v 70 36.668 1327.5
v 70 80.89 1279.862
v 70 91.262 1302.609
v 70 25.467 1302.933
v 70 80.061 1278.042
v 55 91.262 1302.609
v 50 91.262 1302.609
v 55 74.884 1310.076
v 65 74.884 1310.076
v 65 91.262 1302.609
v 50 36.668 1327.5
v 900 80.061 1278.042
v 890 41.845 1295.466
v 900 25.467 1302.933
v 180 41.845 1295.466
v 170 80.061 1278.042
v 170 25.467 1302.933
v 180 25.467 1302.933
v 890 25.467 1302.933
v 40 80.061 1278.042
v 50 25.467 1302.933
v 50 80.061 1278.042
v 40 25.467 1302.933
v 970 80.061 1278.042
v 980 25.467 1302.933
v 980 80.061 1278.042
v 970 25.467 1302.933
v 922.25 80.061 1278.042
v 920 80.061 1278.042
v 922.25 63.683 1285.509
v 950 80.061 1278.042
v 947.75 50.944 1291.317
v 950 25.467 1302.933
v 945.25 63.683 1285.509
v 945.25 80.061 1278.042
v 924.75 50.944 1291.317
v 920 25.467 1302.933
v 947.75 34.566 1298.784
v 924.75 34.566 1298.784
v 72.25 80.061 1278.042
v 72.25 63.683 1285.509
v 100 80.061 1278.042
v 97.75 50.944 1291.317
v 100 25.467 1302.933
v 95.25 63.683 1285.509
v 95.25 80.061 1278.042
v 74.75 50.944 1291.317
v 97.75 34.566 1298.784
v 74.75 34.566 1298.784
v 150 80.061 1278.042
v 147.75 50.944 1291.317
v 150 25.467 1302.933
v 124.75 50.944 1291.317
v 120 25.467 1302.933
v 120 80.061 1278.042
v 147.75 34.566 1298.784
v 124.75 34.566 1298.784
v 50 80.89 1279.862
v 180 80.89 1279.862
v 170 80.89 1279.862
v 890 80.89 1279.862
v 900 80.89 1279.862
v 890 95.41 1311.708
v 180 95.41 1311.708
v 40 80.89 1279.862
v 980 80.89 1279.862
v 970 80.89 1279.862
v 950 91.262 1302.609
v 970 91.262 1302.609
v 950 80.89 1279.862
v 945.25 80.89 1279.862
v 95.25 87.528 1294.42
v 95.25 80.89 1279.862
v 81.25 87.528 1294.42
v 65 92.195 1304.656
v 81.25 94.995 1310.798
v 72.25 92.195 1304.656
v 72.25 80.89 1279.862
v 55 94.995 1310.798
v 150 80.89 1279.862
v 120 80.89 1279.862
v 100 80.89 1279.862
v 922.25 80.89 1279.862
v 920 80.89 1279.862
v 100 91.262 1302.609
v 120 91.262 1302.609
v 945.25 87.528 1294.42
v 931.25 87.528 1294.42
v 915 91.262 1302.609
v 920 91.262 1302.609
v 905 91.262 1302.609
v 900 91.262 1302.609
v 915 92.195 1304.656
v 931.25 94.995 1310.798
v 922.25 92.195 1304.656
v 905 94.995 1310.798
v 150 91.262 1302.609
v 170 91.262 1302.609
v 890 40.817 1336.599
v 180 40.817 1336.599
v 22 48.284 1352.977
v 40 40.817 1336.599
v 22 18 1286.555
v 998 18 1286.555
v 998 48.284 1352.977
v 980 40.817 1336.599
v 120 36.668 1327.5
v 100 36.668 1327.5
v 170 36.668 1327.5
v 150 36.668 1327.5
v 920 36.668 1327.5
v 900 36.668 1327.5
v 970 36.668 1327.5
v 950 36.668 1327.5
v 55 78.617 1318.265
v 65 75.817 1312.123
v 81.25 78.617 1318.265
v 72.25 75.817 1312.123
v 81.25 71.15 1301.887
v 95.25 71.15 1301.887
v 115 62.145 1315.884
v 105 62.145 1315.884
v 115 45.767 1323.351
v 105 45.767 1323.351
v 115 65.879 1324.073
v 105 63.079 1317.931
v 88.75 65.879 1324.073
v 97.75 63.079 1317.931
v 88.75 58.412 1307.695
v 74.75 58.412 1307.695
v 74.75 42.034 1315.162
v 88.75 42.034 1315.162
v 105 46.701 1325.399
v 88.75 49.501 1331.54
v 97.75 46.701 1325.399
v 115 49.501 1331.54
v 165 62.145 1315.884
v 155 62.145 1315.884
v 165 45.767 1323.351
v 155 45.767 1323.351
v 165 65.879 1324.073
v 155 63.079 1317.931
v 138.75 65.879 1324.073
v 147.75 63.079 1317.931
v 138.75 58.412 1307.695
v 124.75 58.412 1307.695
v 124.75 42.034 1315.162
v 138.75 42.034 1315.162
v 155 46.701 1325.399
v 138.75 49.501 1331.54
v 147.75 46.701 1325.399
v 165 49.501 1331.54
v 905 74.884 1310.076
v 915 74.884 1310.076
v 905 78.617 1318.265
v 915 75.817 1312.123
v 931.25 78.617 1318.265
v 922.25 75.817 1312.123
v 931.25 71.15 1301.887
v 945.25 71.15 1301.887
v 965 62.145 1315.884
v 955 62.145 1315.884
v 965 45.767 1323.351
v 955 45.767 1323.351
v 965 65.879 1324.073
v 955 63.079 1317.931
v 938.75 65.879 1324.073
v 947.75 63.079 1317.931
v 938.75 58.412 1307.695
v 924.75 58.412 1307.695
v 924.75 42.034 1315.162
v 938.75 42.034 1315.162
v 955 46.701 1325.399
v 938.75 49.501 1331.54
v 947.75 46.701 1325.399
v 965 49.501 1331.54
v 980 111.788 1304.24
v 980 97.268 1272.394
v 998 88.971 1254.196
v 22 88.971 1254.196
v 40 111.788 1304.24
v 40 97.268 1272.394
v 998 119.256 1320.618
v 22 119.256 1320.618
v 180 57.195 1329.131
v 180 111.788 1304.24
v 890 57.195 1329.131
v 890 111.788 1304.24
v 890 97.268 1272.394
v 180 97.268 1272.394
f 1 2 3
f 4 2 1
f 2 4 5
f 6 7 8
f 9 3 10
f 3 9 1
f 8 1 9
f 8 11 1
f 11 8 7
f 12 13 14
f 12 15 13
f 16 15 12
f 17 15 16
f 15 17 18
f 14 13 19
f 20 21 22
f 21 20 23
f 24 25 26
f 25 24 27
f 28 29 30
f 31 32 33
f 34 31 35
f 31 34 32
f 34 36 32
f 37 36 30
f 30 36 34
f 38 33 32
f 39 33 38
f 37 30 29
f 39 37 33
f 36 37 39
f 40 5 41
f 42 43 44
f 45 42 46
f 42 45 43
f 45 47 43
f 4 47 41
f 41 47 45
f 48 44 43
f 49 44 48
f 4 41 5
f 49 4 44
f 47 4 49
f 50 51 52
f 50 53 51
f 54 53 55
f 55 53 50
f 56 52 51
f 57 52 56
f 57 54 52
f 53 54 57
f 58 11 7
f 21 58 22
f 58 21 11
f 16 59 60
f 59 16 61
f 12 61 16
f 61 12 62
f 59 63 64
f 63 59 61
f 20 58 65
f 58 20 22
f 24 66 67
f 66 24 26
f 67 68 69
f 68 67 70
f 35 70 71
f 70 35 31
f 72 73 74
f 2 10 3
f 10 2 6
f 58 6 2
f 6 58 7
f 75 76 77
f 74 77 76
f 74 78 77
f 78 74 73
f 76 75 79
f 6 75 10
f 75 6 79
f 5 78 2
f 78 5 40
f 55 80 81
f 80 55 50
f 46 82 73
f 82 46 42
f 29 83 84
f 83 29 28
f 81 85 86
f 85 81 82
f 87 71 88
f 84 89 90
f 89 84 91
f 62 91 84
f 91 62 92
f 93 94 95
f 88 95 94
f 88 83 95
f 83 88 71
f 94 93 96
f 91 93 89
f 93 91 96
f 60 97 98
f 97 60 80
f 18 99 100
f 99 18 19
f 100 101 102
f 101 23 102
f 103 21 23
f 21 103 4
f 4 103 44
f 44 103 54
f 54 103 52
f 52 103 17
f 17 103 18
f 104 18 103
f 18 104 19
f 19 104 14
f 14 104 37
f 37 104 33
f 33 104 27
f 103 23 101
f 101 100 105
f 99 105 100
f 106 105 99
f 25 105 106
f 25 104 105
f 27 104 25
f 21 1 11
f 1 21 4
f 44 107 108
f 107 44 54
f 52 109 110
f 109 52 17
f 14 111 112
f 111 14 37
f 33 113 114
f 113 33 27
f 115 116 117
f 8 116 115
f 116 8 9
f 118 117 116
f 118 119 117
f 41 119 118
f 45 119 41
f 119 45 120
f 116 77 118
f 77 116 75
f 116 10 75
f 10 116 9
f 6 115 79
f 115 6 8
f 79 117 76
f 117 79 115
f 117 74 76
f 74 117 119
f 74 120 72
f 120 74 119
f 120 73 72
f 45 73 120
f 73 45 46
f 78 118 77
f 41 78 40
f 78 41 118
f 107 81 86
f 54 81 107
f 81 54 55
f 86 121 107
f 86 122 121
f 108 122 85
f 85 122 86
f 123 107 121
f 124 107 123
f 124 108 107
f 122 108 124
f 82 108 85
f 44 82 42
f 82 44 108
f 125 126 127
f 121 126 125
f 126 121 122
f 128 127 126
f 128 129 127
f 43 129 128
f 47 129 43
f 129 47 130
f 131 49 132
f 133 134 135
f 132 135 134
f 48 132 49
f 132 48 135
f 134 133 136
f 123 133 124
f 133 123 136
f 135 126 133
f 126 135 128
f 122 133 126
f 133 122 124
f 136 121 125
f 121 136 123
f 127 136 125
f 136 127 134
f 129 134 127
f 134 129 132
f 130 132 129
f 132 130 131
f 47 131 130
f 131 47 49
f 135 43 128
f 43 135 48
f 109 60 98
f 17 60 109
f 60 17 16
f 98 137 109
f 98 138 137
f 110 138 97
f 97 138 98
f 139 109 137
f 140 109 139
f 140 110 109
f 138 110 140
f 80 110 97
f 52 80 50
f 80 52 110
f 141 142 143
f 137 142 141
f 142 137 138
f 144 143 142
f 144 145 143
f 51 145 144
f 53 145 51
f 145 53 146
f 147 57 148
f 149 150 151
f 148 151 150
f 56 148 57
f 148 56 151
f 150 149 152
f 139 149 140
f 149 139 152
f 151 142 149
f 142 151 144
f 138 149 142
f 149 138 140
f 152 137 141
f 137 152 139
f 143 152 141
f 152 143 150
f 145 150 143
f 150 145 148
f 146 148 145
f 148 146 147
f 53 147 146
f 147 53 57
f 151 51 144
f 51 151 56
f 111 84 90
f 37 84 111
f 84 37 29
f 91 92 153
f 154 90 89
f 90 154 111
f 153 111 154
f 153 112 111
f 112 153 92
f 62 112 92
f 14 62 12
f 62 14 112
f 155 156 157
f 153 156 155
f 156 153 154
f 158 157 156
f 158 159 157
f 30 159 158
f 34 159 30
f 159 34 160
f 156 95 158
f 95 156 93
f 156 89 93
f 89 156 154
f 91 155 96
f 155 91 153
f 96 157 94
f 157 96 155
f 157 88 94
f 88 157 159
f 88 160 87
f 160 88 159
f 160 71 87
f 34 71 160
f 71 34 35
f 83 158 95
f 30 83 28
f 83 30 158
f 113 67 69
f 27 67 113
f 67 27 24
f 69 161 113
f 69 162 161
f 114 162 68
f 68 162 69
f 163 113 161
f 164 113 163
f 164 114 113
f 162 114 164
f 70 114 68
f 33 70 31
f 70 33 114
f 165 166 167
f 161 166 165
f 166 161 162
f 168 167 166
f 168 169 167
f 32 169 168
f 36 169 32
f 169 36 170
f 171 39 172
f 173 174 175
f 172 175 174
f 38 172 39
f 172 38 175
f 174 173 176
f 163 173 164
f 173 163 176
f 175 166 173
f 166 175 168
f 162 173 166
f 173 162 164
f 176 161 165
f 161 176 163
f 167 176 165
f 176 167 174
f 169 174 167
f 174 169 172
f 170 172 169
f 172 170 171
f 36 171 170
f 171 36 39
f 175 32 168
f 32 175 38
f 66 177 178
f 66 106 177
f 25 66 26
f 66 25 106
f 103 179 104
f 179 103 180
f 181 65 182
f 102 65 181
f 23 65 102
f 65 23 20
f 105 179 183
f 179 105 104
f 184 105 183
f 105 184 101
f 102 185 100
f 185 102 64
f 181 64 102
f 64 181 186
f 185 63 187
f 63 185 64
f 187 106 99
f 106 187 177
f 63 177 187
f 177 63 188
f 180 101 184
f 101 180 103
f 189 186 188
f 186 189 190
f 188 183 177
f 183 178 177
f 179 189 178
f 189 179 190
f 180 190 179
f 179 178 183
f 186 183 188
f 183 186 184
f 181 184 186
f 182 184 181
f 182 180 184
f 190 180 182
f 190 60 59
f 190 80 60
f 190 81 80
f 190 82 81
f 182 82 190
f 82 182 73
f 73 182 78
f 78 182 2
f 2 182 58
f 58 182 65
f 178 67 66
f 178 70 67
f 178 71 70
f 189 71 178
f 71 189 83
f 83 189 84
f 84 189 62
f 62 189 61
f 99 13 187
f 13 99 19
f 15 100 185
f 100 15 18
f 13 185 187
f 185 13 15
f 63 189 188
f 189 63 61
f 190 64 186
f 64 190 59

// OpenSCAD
// file: params.scad
sheet_thickness=18;				// thickness of the plywood sheet.

laser_width=20;					// width of the laser
laser_height=27;				// height of the laser
laser_origin_height=16;			// center of the laser beam
laser_length=60;				// length of the laser (includes cable allowance).
laser_spread_angle = 2*atan((110/2)/60);	// angle the laser spreads out from origin.

laser_setback        =  48.45*10;	// how much the laser is set back from the center of the bike.
laser_position_z     = 119.26*10;	// height of the laser center.
laser_position_angle =  24.51;		// angle the laser points down.

laser_low = 50;
laser_high=1350;

laser_y = laser_length;

wheel_width=34;					// maximum width of a wheel
wheel_height=670;				// height of a 700CC wheel.

handlebar_width_max = 500;
channel_offset = handlebar_width_max / 2 + 20;
channel_thickness = 50;

base_length=1500;

hb_85=50+laser_width/2;			// position of handlebar 85cm line (centered on laser)
hb_80=hb_85+50;					// position of handlebar 80cm line
hb_75=hb_80+50;					// position of handlebar 75cm line

bb_0=hb_75+750;					// position of bottom bracket line
bb_5=bb_0+50;					// position of bottom bracket +5cm line

// castor dimensions GD-60F (2" wheel, leveling castor).
castor_height = 82;
castor_radius = 61;
castor_plate = 73;

// bottom of the jig from the floor.
base_bottom = sheet_thickness + castor_height;

tab_height = 2*25.4;	// Height of the tabs to attach the column and back.

// utility functions.

function rotate_point(p,a) = [p[0]*cos(a) - p[1]*sin(a), p[0]*sin(a) + p[1]*cos(a)];

// output the sheet thickness so export.py knows how to created the files.
echo( sheet_thickness=sheet_thickness );
// main file
include <params.scad>

show_laser_lines = 0;

laser_clearance = 10;   // Clearance around the laser modules.
lasers_x = hb_85-laser_width/2-laser_clearance-sheet_thickness;
lasers_margin = laser_width/2+laser_clearance+sheet_thickness;
lasers_length = (bb_5-hb_85)+2*lasers_margin;
lasers_height = sheet_thickness*2 + laser_height + laser_clearance;
lasers_width = laser_length+sheet_thickness;

lasers_back_yz = rotate_point( [-laser_length, -laser_origin_height-sheet_thickness],
                    -laser_position_angle );
lasers_front_yz = rotate_point( [sheet_thickness, -laser_origin_height-sheet_thickness],
                    -laser_position_angle );
                    
lasers_effective_width = abs(lasers_back_yz[0]-lasers_front_yz[0]);

base_width =
    sheet_thickness +
    abs(lasers_back_yz[0]) + laser_setback +
    channel_offset +
    sheet_thickness;
 
back_height_over = 5;
back_height=(laser_setback + channel_offset) * tan(laser_spread_angle/2 - laser_position_angle) + laser_position_z + back_height_over;
    
channel_center = base_width - sheet_thickness + channel_offset;

module laser_clamp( p, back ) {
    laser_clearance = 10;
    clamp_thickness = laser_clearance - 1;
    foot_length = 14 + clamp_thickness;
    border = 2.25;
    pad = 10;
    overlap = 0.25;
    
    laser_clamp_points = [
        [0,0],
        [foot_length, 0],
        [foot_length, laser_height + border],
        [foot_length + border + laser_width/2 - pad/2, laser_height + border],
        [foot_length + border + laser_width/2 - pad/2, laser_height - overlap],
        [foot_length + border + laser_width/2 + pad/2, laser_height - overlap],
        [foot_length + border + laser_width/2 + pad/2, laser_height + clamp_thickness],
        [foot_length - border - clamp_thickness + border, laser_height + clamp_thickness],
        [foot_length - border - clamp_thickness + border, sheet_thickness],    
        [0, sheet_thickness],    
    ];
    echo( laser_clamp_points=laser_clamp_points );
    pad_middle = laser_clamp_points[5][0] - pad/2;
    
    translate( p ) {
        color( [.9,.9,0] )
        if( back ) {
            translate( [0,10,0] )
            translate( [-pad_middle,sheet_thickness,0] )
            rotate( [90,0,0] )
            linear_extrude( height=sheet_thickness )
            polygon( laser_clamp_points );
        }
        else {
            translate( [laser_clamp_points[3][0]+laser_width/2-pad/2,laser_length-sheet_thickness,0] )
            rotate( [90,0,180] )
            linear_extrude( height=sheet_thickness )
            polygon( laser_clamp_points );
        }
    }
}

module lasers() {
    translate( [lasers_x, sheet_thickness+abs(lasers_back_yz[0]), base_bottom+laser_position_z] )
    rotate( [-laser_position_angle, 0, 0] )
    translate( [0,-(lasers_width-sheet_thickness),-(laser_origin_height+sheet_thickness)] ) {
        // Draw the laser modules and clamps.
        laser_start = sheet_thickness+laser_clearance;
        laser = [laser_width, laser_length, laser_height];
        translate( [laser_start, 0, sheet_thickness] ) {
            lps = [hb_85-hb_85, hb_80-hb_85, hb_75-hb_85, bb_0-hb_85, bb_5-hb_85];
            for( lp = lps ) {
                translate( [lp, 0, 0] )
                color( [1,.5,0] )
                cube( laser );
                
                laser_clamp( [lp+laser_width/2, 0, 0], lp==lps[1] || lp==lps[2] || lp==lps[4] );
            }
        }
        
        color( [.9,.9,.9] ) {
            //------------------------------------------
            lasers_bottom = [lasers_length-sheet_thickness*2, laser_length, sheet_thickness];
            echo( lasers_bottom=lasers_bottom );
            
            translate( [sheet_thickness, 0, 0] )
            cube( lasers_bottom );
            
            //------------------------------------------
            lasers_top = [lasers_length, lasers_width, sheet_thickness];
            echo( lasers_top=lasers_top );
            
            translate( [0, 0, lasers_height-sheet_thickness] )
            cube( lasers_top );
            
            //------------------------------------------
            lip = 2;
            lasers_front = [lasers_length-sheet_thickness*2, sheet_thickness, sheet_thickness+lip];
            echo( lasers_front=lasers_front );

            translate( [sheet_thickness, lasers_width-sheet_thickness, 0] )
            cube( lasers_front );
            
            //------------------------------------------
            lasers_end = [sheet_thickness, lasers_width, lasers_height-sheet_thickness];
            echo( "2x", lasers_end=lasers_end );
            
            translate( [0,0,0] )
            cube( lasers_end );
            translate( [lasers_length-sheet_thickness,0,0] )
            cube( lasers_end );
 
            //------------------------------------------
            laser_side_start = lasers_margin + (hb_75 - hb_85) + laser_width/2 + laser_clearance;
            laser_side_end = lasers_length - lasers_margin - (bb_5-bb_0) - laser_width/2 - laser_clearance;
            laser_side = [laser_side_end-laser_side_start, sheet_thickness, lasers_height-sheet_thickness*2];
            echo( "2x", laser_side=laser_side );
            
            translate( [laser_side_start, 0, sheet_thickness] )
            cube( laser_side );
            translate( [laser_side_start, lasers_width-sheet_thickness, sheet_thickness] )
            cube( laser_side );
            
            //------------------------------------------
            //lasers_spacer = [sheet_thickness, lasers_width-sheet_thickness, lasers_height-sheet_thickness*2];
            //echo( "5x", lasers_spacer=lasers_spacer );
            
            //spacer_start = lasers_margin + (hb_75 - hb_85) + laser_width/2 + laser_clearance;
            //spacer_end = lasers_length - lasers_margin - (bb_5-bb_0) - laser_width/2 - laser_clearance - sheet_thickness;
            //spacer_inc = (spacer_end - spacer_start) / 4;
            //echo( lasers_length=lasers_length, spacer_start=spacer_start, spacer_end=spacer_end, spacer_inc=spacer_inc );
            //for (i = [0:4]) {
            //    translate( [spacer_start + i * spacer_inc,laser_clearance,sheet_thickness] )
            //    cube( lasers_spacer );
            //}
        }
    }
}

module laser_lines() {
	a = laser_spread_angle/2+laser_position_angle;
	base_intersect = laser_position_z / tan( a );
	points = [
		[0,0],
		[-laser_position_z, base_intersect],
		[-laser_position_z, laser_setback + channel_offset],
		[back_height-laser_position_z-back_height_over, laser_setback + channel_offset],
	];
    y = base_width - sheet_thickness - channel_offset - laser_setback;  
    x = lasers_x+sheet_thickness+laser_clearance+laser_width/2;
	color( [0,1,0,.05] ) {
        translate( [x, y, laser_position_z + base_bottom] )
		for( lp = [hb_85-hb_85, hb_80-hb_85, hb_75-hb_85, bb_0-hb_85, bb_5-hb_85] ) {
			translate( [lp, 0, 0] )
			rotate( a=[0,270,0] )
			linear_extrude( height=1 )
			polygon( points );
		}
	}
}

lasers();
if( show_laser_lines ) {
	laser_lines();
}
